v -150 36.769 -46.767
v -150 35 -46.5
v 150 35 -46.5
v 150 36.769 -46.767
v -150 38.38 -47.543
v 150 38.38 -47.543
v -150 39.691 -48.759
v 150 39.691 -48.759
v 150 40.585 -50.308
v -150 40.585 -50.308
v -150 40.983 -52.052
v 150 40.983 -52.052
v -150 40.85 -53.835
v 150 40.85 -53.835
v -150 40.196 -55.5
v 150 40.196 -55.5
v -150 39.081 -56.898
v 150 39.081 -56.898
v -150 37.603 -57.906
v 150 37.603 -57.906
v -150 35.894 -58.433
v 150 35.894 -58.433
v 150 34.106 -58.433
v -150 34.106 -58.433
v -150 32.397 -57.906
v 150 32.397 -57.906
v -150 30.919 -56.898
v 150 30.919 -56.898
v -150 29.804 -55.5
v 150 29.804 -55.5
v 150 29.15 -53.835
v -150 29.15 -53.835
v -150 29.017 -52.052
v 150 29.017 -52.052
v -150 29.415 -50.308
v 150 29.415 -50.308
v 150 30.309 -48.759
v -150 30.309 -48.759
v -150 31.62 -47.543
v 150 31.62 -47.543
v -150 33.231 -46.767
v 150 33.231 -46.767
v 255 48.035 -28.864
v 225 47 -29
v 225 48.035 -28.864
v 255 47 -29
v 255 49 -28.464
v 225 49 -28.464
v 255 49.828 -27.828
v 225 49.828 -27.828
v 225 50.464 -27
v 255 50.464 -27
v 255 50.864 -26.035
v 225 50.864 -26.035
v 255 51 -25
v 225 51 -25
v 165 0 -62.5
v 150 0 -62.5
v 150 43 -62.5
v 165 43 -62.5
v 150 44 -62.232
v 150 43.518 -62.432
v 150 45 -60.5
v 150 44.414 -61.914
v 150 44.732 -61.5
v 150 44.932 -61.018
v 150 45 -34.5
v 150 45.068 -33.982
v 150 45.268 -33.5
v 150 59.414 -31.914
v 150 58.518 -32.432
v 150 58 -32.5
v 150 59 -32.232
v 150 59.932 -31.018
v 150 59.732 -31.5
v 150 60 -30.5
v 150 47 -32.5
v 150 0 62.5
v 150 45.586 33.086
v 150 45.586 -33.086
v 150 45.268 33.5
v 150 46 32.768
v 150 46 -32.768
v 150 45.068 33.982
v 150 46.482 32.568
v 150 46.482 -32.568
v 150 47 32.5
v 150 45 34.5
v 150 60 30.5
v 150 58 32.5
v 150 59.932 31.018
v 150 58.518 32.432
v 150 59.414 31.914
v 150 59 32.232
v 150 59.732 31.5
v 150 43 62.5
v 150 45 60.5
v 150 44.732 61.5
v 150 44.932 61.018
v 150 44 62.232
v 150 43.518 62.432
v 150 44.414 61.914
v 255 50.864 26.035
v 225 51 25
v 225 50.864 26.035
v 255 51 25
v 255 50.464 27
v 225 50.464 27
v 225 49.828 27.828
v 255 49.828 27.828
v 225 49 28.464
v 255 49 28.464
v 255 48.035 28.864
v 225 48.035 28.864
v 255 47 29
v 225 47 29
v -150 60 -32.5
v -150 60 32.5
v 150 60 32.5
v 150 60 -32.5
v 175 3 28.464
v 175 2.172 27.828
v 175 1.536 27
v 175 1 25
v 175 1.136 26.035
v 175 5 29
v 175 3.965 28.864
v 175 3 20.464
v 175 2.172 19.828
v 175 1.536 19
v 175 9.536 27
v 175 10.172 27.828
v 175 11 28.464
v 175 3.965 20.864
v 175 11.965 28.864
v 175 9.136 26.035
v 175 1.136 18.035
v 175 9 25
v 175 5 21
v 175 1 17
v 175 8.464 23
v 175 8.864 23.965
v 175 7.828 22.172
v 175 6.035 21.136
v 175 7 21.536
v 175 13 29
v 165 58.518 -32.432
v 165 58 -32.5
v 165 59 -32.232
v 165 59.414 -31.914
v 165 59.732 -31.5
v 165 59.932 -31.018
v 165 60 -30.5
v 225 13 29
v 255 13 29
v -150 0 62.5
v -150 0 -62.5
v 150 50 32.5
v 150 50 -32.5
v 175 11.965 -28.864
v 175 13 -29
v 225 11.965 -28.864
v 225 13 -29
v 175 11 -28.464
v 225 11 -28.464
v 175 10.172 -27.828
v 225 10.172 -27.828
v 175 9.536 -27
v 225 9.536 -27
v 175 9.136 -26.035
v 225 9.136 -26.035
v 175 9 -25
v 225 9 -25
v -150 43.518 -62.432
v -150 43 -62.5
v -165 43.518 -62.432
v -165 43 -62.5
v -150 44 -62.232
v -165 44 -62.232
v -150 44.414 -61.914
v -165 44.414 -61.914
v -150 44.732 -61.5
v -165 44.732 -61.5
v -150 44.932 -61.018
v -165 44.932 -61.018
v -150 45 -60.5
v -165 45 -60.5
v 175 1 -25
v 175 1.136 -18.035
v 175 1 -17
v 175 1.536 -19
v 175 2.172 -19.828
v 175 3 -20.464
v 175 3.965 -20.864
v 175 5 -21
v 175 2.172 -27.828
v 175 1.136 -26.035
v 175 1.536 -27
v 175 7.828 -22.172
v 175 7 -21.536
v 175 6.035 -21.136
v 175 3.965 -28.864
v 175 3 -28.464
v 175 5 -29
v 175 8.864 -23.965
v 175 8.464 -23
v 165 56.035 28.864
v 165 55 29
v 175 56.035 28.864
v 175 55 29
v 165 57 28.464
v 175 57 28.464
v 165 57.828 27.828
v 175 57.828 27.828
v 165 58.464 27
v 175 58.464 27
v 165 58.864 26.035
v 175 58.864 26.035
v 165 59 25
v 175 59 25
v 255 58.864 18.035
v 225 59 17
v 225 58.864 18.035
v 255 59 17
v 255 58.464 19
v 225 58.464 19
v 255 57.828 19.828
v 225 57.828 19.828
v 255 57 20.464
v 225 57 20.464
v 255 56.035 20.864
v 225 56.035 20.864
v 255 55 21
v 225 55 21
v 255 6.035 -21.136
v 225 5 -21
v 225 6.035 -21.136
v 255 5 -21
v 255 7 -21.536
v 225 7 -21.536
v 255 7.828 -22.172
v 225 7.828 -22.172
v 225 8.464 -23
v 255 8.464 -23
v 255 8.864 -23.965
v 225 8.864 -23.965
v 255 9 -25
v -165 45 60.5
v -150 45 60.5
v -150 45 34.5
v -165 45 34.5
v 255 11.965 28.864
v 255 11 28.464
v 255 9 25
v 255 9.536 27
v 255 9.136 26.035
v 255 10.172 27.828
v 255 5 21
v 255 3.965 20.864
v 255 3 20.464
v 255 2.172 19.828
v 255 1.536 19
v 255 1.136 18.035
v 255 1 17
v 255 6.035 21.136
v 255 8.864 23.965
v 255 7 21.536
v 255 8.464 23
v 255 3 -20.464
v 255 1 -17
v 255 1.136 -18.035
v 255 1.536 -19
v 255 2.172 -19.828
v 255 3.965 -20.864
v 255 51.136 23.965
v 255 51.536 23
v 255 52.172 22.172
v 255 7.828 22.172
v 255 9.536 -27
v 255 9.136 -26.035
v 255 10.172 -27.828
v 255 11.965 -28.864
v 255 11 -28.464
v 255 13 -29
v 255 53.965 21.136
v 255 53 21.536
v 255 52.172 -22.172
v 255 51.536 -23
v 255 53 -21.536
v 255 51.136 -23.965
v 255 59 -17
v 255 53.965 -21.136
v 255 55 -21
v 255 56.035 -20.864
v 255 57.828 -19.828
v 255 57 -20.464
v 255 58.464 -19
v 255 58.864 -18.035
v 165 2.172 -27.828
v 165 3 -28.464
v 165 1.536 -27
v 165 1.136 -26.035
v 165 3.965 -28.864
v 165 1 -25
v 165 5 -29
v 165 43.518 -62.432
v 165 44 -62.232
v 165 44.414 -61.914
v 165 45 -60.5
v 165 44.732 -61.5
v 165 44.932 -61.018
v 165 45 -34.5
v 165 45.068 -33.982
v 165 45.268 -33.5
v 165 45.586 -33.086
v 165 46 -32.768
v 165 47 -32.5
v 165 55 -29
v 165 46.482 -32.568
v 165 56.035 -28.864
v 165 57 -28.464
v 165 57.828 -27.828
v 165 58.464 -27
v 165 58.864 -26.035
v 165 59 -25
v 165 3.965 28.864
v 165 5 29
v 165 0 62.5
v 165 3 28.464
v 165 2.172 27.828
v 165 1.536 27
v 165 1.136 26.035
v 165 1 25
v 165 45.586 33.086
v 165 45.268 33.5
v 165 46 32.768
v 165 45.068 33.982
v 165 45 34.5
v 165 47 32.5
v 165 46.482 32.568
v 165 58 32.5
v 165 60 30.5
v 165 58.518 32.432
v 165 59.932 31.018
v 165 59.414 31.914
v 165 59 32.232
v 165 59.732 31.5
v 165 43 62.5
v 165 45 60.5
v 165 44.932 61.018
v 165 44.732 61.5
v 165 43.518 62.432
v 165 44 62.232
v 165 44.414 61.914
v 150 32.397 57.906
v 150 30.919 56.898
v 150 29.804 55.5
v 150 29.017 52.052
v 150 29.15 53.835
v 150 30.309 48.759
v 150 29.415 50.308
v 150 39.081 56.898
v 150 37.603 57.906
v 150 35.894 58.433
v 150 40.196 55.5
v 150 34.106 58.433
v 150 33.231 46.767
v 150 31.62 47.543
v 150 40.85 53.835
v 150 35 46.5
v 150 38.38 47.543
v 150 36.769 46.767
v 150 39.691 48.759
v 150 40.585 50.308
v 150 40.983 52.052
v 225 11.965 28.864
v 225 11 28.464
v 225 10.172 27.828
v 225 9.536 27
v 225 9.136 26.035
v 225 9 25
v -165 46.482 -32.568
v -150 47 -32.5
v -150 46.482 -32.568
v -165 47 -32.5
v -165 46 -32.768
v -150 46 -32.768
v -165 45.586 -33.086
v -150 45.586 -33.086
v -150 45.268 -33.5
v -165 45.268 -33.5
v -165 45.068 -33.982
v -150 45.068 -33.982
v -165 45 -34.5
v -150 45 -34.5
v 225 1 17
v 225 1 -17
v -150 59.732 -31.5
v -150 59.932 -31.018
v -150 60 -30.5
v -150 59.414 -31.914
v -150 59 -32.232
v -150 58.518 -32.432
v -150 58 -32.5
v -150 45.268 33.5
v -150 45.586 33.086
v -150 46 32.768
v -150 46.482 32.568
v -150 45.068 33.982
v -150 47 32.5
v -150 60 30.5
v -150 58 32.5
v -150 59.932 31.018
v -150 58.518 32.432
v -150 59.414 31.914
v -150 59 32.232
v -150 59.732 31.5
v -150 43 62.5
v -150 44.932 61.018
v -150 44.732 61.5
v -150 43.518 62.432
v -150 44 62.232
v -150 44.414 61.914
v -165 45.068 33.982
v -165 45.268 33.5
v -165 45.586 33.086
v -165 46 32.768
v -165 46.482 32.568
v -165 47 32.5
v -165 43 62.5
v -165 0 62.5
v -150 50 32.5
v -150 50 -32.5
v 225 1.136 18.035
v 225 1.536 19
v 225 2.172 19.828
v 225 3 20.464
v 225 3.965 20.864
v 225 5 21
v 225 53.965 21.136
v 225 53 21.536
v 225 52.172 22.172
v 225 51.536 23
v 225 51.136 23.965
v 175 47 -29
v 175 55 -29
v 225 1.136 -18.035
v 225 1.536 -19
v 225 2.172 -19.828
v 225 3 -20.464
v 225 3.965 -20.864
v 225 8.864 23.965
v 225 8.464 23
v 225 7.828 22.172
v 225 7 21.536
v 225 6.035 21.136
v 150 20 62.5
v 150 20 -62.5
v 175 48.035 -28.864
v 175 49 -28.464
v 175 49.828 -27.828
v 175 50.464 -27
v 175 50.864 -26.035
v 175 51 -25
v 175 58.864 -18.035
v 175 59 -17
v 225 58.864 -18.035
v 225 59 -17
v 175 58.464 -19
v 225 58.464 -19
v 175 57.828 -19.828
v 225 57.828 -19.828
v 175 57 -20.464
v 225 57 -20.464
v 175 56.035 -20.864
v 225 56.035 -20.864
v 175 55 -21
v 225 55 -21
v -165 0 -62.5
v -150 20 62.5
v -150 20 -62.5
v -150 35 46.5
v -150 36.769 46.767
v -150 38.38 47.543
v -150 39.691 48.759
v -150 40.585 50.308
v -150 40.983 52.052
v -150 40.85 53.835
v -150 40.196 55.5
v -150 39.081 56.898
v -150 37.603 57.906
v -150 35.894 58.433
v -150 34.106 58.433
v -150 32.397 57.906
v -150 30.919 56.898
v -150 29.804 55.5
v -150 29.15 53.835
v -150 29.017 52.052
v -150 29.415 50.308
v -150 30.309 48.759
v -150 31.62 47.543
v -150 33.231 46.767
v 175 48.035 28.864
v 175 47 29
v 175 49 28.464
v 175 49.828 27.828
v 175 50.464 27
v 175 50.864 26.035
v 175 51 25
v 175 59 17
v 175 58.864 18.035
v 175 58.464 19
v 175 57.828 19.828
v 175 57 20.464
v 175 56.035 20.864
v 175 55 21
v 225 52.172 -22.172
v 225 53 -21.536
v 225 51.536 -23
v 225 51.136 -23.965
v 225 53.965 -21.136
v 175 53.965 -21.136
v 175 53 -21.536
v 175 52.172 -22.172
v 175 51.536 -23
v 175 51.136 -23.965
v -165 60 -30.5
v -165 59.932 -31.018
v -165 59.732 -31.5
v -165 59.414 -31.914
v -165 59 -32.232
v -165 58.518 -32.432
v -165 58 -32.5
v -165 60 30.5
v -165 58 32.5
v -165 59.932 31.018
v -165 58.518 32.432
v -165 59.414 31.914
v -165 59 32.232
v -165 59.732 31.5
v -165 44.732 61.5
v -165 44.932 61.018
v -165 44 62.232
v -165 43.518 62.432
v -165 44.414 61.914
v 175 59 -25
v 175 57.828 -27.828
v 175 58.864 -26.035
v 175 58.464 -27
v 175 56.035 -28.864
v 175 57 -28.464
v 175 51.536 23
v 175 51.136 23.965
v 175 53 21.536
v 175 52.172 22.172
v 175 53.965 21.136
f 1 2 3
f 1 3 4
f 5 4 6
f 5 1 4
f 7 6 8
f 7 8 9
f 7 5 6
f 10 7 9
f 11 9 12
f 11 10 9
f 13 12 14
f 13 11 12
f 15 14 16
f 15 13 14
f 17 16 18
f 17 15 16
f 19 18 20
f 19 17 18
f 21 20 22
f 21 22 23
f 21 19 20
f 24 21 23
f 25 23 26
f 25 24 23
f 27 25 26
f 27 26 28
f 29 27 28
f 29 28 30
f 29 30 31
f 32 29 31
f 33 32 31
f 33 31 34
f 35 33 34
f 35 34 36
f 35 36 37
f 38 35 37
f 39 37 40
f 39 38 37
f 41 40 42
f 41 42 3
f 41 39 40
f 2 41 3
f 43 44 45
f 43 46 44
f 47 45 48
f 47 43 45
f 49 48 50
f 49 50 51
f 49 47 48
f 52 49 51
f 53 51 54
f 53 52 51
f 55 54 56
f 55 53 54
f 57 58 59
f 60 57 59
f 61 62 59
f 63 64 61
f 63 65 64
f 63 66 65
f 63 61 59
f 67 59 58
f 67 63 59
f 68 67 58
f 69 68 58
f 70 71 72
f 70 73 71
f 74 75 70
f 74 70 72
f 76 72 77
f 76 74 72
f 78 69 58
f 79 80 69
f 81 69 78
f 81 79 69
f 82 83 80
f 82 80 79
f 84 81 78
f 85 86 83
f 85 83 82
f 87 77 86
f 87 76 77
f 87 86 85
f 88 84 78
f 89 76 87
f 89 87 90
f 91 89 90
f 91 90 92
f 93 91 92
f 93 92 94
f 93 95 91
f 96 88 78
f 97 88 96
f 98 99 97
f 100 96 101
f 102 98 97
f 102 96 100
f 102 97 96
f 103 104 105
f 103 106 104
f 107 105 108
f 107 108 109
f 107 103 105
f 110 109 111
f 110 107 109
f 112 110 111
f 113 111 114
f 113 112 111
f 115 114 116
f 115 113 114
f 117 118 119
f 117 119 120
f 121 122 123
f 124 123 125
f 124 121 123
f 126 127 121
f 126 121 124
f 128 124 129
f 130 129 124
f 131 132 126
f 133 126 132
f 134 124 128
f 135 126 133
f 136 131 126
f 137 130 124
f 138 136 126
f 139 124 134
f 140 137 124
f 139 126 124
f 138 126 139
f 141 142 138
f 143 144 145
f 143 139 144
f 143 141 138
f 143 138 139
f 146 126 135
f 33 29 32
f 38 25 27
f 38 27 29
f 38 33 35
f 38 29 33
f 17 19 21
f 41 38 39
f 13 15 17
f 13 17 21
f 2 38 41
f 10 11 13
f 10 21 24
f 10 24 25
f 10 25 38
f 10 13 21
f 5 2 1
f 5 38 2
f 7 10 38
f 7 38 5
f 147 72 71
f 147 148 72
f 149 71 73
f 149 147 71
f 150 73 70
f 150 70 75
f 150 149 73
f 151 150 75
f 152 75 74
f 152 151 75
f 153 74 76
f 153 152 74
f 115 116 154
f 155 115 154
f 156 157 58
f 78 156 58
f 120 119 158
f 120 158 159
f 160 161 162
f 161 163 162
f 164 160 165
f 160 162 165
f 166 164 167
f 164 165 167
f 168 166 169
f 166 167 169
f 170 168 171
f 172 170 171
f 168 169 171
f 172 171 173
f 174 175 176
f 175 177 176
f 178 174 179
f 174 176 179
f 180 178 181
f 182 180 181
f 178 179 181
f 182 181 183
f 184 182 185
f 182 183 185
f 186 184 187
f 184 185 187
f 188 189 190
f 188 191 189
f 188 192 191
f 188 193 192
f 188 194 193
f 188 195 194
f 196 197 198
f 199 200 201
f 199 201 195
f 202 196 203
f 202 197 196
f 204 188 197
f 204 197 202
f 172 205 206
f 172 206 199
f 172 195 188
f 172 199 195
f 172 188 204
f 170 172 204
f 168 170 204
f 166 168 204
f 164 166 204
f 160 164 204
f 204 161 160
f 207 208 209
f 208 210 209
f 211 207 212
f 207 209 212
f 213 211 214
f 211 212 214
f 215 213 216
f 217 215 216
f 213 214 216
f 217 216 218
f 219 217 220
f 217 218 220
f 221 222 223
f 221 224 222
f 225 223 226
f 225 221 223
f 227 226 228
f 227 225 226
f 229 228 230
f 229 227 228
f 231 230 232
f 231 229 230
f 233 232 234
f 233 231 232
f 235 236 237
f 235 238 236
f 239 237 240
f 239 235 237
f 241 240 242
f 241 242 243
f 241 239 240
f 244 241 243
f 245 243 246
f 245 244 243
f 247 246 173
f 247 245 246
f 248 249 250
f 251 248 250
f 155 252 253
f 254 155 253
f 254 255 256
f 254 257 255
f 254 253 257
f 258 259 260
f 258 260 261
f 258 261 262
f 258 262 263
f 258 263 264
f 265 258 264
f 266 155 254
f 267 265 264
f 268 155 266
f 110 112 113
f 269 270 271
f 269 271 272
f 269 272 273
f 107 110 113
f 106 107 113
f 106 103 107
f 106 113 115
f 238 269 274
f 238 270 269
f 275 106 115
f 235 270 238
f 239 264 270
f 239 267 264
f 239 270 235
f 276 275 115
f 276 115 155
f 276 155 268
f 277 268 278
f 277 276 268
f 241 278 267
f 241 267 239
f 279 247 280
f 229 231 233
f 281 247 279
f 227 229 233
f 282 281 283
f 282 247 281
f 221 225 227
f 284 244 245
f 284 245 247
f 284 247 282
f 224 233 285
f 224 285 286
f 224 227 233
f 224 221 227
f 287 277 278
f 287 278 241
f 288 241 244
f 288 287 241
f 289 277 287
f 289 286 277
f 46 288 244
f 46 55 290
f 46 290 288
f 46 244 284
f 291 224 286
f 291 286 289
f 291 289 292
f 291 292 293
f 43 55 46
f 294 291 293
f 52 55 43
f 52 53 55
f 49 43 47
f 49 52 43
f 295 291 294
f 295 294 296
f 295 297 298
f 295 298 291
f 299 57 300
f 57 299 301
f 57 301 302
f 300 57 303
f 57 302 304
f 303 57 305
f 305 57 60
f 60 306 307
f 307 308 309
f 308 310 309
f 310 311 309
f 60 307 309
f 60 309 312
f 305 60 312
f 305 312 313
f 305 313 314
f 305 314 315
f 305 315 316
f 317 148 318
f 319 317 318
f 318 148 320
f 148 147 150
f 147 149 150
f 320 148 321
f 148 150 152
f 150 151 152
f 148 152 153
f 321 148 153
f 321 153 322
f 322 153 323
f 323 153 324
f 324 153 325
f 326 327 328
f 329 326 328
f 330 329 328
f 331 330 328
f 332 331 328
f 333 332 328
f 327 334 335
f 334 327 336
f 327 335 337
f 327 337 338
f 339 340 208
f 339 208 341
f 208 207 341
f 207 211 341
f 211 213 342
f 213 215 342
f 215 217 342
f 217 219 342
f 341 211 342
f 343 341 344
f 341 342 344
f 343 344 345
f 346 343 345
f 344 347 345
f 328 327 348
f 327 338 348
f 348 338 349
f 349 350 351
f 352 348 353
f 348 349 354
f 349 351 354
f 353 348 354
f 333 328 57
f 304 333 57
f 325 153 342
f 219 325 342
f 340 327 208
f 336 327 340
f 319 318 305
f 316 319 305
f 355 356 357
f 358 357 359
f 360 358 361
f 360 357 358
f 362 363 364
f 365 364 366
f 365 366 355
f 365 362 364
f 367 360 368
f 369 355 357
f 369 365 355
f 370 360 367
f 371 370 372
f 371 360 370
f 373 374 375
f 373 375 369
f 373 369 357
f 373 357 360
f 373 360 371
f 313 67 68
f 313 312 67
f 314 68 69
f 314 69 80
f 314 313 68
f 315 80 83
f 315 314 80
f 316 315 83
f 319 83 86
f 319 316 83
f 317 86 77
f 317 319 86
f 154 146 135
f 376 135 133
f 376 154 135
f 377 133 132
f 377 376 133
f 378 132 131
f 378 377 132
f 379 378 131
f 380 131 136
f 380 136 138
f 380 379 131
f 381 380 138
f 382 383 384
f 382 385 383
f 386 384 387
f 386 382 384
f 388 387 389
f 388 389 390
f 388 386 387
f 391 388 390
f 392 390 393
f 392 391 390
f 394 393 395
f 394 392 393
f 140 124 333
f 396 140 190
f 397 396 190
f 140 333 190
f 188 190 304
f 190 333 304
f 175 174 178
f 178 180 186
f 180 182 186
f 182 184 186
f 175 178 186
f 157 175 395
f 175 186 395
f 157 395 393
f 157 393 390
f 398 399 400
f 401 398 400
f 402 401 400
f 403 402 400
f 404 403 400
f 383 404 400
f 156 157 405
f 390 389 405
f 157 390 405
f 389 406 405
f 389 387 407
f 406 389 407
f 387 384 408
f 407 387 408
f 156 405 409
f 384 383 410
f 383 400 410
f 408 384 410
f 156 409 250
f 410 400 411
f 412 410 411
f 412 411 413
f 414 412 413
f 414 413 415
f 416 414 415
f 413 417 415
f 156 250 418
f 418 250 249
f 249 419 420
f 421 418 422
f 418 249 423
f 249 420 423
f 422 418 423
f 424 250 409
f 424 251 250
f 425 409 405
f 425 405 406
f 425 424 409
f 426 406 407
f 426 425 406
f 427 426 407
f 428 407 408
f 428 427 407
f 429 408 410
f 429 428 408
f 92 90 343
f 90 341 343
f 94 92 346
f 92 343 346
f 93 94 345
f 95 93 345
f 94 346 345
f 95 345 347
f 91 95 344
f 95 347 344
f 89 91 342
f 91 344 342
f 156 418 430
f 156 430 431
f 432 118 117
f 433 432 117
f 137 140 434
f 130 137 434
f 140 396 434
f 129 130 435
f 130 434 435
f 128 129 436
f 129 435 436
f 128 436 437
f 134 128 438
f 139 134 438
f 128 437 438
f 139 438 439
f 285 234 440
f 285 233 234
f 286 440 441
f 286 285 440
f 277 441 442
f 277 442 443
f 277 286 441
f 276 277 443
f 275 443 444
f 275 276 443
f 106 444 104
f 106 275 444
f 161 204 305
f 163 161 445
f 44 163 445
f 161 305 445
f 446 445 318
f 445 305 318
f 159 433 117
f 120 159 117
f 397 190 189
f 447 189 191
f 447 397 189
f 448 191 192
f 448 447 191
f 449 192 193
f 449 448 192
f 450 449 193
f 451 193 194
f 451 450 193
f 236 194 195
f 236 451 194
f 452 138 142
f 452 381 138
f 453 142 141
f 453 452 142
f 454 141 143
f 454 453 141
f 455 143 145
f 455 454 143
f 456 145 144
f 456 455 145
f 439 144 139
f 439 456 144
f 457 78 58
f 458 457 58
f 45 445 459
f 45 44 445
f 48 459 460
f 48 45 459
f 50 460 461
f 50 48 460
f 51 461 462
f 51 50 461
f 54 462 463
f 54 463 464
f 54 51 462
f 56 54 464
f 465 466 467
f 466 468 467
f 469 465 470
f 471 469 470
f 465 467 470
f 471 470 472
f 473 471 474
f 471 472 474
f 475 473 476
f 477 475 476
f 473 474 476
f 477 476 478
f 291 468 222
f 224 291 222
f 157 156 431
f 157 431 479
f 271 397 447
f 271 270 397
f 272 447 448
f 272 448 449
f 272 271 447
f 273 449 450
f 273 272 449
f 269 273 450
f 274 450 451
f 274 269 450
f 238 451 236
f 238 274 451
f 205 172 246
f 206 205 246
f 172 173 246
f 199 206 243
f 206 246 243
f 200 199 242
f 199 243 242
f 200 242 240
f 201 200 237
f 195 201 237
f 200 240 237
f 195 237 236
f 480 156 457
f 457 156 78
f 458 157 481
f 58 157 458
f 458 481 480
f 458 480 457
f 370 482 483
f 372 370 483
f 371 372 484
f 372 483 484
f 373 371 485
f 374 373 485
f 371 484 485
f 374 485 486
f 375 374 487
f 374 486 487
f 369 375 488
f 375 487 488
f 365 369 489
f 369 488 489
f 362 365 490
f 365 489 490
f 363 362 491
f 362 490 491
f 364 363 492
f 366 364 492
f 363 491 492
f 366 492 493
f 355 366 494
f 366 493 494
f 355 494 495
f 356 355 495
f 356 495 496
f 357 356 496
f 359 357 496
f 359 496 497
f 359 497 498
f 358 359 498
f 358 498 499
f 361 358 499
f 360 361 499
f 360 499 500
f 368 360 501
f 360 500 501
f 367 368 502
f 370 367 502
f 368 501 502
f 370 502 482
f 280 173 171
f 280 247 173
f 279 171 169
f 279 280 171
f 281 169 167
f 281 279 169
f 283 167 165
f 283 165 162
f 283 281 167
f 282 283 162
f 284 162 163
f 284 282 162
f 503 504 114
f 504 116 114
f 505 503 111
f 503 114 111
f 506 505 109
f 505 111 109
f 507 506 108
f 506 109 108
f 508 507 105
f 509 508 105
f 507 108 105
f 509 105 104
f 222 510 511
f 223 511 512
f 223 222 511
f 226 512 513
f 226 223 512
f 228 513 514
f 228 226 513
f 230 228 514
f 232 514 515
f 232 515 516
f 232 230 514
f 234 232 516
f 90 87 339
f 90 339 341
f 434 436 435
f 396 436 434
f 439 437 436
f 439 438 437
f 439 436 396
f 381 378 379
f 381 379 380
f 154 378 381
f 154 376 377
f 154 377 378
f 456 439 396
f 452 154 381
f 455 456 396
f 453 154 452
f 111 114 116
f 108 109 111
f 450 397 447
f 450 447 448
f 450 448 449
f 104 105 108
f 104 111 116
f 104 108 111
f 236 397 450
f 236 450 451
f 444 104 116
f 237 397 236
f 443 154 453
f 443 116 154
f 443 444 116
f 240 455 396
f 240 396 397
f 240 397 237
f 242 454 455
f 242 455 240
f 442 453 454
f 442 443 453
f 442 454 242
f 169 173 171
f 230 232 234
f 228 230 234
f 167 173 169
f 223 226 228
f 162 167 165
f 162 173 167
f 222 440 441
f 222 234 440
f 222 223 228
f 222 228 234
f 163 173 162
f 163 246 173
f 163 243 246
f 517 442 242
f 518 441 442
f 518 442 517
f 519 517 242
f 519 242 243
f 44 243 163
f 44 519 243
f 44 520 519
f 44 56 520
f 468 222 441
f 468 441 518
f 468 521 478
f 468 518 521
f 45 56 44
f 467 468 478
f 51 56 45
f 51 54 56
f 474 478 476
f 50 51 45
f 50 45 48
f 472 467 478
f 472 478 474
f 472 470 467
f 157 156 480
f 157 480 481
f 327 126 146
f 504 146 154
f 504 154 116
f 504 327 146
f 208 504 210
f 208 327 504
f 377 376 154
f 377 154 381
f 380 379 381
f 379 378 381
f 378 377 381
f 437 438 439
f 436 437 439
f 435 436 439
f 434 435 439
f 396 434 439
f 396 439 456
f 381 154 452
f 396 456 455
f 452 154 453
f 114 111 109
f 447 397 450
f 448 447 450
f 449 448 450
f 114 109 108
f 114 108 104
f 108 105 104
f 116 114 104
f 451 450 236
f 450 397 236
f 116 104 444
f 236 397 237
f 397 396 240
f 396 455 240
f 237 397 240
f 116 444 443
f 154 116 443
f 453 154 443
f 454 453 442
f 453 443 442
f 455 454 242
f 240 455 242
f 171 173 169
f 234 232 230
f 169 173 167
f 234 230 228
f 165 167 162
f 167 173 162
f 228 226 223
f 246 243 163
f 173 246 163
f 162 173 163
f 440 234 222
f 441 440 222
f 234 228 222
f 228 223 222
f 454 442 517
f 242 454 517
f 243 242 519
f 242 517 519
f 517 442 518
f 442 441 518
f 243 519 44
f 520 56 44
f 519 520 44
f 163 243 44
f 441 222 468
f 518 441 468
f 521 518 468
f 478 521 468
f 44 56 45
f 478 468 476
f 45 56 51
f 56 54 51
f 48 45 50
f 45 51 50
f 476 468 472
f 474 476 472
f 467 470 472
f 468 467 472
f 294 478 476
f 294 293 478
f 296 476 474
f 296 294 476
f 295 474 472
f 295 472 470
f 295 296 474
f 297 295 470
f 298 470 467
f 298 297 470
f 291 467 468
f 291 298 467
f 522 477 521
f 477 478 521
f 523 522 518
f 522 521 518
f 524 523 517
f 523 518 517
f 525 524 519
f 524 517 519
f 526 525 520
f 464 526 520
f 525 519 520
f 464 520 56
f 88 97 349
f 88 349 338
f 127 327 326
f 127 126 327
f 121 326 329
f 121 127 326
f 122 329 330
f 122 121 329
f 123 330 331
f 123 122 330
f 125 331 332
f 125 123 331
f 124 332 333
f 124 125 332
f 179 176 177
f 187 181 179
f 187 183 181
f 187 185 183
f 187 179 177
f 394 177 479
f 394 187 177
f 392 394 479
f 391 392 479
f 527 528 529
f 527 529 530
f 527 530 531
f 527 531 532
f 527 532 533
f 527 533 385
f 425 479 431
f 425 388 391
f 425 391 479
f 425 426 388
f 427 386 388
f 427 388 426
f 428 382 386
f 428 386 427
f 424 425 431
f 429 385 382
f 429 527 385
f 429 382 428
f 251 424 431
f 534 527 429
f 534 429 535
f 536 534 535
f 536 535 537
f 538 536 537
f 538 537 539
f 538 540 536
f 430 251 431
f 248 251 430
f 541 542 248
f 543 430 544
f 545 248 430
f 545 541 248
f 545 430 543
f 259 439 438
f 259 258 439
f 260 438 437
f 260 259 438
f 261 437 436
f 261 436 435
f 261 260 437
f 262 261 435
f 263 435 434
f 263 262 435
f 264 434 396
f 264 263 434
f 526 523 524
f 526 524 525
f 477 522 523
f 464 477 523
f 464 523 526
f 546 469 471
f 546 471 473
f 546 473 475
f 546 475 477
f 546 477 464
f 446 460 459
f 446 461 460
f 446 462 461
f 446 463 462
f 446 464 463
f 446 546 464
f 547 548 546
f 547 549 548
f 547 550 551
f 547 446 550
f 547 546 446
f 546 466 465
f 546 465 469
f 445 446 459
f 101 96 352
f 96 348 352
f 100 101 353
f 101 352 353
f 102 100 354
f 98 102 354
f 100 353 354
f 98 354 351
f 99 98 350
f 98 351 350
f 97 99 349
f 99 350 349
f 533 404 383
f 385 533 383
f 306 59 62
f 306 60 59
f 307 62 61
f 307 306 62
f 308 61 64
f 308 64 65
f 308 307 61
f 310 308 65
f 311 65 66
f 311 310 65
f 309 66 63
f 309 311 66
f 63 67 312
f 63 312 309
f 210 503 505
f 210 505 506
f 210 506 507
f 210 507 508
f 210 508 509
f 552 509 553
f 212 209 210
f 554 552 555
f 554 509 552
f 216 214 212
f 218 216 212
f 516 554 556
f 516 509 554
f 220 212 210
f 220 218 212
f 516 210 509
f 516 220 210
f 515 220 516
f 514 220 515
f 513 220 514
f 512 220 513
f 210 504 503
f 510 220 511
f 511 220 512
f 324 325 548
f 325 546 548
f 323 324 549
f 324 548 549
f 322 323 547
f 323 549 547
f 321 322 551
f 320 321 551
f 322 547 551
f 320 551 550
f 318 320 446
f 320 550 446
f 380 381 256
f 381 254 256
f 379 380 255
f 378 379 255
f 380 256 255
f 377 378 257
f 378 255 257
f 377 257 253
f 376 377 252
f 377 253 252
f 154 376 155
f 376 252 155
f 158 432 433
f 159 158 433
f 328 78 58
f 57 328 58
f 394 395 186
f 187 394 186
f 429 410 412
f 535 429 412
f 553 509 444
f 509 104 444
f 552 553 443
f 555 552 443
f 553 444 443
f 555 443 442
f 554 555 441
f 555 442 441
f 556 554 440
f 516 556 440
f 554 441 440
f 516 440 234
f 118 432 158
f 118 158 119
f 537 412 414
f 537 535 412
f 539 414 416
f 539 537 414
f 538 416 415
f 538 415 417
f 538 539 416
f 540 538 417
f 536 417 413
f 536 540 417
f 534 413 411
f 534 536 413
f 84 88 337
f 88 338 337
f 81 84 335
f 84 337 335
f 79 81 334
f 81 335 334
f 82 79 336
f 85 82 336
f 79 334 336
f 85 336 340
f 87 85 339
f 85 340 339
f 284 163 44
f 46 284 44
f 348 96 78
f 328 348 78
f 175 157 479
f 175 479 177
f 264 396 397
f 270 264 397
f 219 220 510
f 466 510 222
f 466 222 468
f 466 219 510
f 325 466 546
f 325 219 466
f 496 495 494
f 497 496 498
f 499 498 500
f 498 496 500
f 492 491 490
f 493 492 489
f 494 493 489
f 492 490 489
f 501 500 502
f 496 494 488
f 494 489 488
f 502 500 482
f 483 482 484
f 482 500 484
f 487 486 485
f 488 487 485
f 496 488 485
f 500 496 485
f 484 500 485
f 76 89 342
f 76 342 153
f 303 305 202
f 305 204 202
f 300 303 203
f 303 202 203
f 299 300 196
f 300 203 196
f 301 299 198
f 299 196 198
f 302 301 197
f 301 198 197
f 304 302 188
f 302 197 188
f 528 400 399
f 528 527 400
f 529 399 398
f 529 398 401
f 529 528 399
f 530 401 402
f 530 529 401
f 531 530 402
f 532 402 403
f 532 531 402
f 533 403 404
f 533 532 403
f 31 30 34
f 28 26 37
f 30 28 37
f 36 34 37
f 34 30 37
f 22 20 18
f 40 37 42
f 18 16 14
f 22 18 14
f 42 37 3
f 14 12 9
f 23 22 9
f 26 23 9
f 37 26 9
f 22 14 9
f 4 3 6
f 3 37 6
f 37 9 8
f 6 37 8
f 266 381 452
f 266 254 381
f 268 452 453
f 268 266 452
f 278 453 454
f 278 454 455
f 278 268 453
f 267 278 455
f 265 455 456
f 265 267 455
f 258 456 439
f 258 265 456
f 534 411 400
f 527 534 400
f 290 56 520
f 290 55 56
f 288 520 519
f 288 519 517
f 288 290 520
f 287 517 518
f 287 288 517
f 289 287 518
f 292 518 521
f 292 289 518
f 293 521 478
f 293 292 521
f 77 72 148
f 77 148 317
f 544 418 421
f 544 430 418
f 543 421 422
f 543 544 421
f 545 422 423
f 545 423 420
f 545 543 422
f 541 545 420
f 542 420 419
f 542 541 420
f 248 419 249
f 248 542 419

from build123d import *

# Parameters (mm, degrees)
SKETCH1_W           = 300
SKETCH1_H           = 125
BOSS_EXTRUDE1_DEPTH = 20
SKETCH2_W           = 125
SKETCH2_H           = 20
BOSS_EXTRUDE2_DEPTH = 15
SKETCH3_R           = 6
BOSS_EXTRUDE3_DEPTH = 300
SKETCH4_W           = 58
SKETCH4_H           = 58
BOSS_EXTRUDE4_DEPTH = 10
BOSS_EXTRUDE5_DEPTH = 50
BOSS_EXTRUDE6_DEPTH = 30
SKETCH7_W           = 65
SKETCH7_H           = 10
BOSS_EXTRUDE7_DEPTH = 300
FILLET1_R           = 2
FILLET2_R           = 2
FILLET3_R           = 4
FILLET4_R           = 4


with BuildPart() as part:
    # Sketch1 → Boss-Extrude1 (new body)
    with BuildSketch(Plane(origin=(0, 0, 0), x_dir=(1, 0, 0), z_dir=(0, 1, 0))):
        Rectangle(SKETCH1_W, SKETCH1_H)
    extrude(amount=BOSS_EXTRUDE1_DEPTH)


with BuildPart() as body_2:
    # Sketch2 → Boss-Extrude2 (new body)
    with BuildSketch(Plane(origin=(150, 0, 0), x_dir=(0, 0, -1), z_dir=(1, 0, 0))):
        Polygon((62.5, 45), (62.5, 20), (-62.5, 20), (-62.5, 45), (-32.5, 45), (-32.5, 60), (32.5, 60), (32.5, 45), align=None)
        with Locations((0, 10)):
            Rectangle(SKETCH2_W, SKETCH2_H)
    extrude(amount=BOSS_EXTRUDE2_DEPTH)


with BuildPart() as body_3:
    # Mirror1: mirrored copy
    add(body_2.part.mirror(Plane(origin=(0, 0, 0), x_dir=(0, 0, 1), z_dir=(1, 0, 0))))

    # Fillet1
    fillet1_edges = [body_3.edges().sort_by_distance(p)[0] for p in [
        (-157.5, 45, 62.5),
        (-157.5, 45, 32.5),
        (-157.5, 60, 32.5),
        (-157.5, 60, -32.5),
        (-157.5, 45, -32.5),
        (-157.5, 45, -62.5),
    ]]
    fillet(fillet1_edges, radius=FILLET1_R)


with BuildPart() as body_4:
    # Sketch3 → Boss-Extrude3 (new body)
    with BuildSketch(Plane(origin=(-150, 0, 0), x_dir=(0, 0, -1), z_dir=(1, 0, 0))):
        with Locations((-52.5, 35)):
            Circle(SKETCH3_R)
    extrude(amount=BOSS_EXTRUDE3_DEPTH)


with BuildPart() as body_5:
    # Mirror2: mirrored copy
    add(body_4.part.mirror(Plane.XY))


with BuildPart() as body_2_1:
    add(body_2.part)

    # Sketch4 → Boss-Extrude4 (add)
    with BuildSketch(Plane(origin=(165, 0, 0), x_dir=(0, 0, -1), z_dir=(1, 0, 0))):
        with Locations((0, 30)):
            Rectangle(SKETCH4_W, SKETCH4_H)
    extrude(amount=BOSS_EXTRUDE4_DEPTH)

    # Sketch5 → Boss-Extrude5 (add)
    with BuildSketch(Plane(origin=(175, 0, 0), x_dir=(0, 0, -1), z_dir=(1, 0, 0))):
        Polygon((21, 59), (-21, 59), (-21, 51), (-29, 51), (-29, 9), (-21, 9), (-21, 1), (21, 1), (21, 9), (29, 9), (29, 51), (21, 51), align=None)
    extrude(amount=BOSS_EXTRUDE5_DEPTH)

    # Fillet2
    fillet2_edges = [body_2_1.edges().sort_by_distance(p)[0] for p in [
        (157.5, 45, 62.5),
        (157.5, 45, 32.5),
        (157.5, 60, 32.5),
        (157.5, 60, -32.5),
        (157.5, 45, -32.5),
        (157.5, 45, -62.5),
    ]]
    fillet(fillet2_edges, radius=FILLET2_R)

    # Fillet3
    fillet3_edges = [body_2_1.edges().sort_by_distance(p)[0] for p in [
        (170, 1, 29),
        (170, 1, -29),
        (170, 59, 29),
        (170, 59, -29),
        (200, 51, -21),
        (200, 9, -21),
        (200, 9, 21),
        (200, 51, 21),
        (200, 9, 29),
        (200, 1, 21),
        (200, 1, -21),
        (200, 9, -29),
        (200, 51, -29),
        (200, 59, -21),
        (200, 51, 29),
        (200, 59, 21),
    ]]
    fillet(fillet3_edges, radius=FILLET3_R - 0.0001)  # a hair under: the kernel refuses the full size


with BuildPart() as body_6:
    # Sketch6 → Boss-Extrude6 (new body)
    with BuildSketch(Plane(origin=(225, 0, 0), x_dir=(0, 0, -1), z_dir=(1, 0, 0))):
        Polygon((-29, 9), (-21, 9), (-21, 1), (21, 1), (21, 9), (29, 9), (29, 51), (21, 51), (21, 59), (-21, 59), (-21, 51), (-29, 51), align=None)
    extrude(amount=BOSS_EXTRUDE6_DEPTH)

    # Fillet4
    fillet4_edges = [body_6.edges().sort_by_distance(p)[0] for p in [
        (240, 1, -21),
        (240, 51, 29),
        (240, 9, 29),
        (240, 1, 21),
        (240, 9, -29),
        (240, 51, -29),
        (240, 59, -21),
        (240, 59, 21),
        (240, 9, -21),
        (240, 9, 21),
        (240, 51, -21),
        (240, 51, 21),
    ]]
    fillet(fillet4_edges, radius=FILLET4_R - 0.0001)  # a hair under: the kernel refuses the full size


with BuildPart() as body_7:
    # Sketch7 → Boss-Extrude7 (new body)
    with BuildSketch(Plane(origin=(-150, 0, 0), x_dir=(0, 0, -1), z_dir=(1, 0, 0))):
        with Locations((0, 55)):
            Rectangle(SKETCH7_W, SKETCH7_H)
    extrude(amount=BOSS_EXTRUDE7_DEPTH)


solid = Compound([part.part, body_3.part, body_4.part, body_5.part, body_2_1.part, body_6.part, body_7.part])
